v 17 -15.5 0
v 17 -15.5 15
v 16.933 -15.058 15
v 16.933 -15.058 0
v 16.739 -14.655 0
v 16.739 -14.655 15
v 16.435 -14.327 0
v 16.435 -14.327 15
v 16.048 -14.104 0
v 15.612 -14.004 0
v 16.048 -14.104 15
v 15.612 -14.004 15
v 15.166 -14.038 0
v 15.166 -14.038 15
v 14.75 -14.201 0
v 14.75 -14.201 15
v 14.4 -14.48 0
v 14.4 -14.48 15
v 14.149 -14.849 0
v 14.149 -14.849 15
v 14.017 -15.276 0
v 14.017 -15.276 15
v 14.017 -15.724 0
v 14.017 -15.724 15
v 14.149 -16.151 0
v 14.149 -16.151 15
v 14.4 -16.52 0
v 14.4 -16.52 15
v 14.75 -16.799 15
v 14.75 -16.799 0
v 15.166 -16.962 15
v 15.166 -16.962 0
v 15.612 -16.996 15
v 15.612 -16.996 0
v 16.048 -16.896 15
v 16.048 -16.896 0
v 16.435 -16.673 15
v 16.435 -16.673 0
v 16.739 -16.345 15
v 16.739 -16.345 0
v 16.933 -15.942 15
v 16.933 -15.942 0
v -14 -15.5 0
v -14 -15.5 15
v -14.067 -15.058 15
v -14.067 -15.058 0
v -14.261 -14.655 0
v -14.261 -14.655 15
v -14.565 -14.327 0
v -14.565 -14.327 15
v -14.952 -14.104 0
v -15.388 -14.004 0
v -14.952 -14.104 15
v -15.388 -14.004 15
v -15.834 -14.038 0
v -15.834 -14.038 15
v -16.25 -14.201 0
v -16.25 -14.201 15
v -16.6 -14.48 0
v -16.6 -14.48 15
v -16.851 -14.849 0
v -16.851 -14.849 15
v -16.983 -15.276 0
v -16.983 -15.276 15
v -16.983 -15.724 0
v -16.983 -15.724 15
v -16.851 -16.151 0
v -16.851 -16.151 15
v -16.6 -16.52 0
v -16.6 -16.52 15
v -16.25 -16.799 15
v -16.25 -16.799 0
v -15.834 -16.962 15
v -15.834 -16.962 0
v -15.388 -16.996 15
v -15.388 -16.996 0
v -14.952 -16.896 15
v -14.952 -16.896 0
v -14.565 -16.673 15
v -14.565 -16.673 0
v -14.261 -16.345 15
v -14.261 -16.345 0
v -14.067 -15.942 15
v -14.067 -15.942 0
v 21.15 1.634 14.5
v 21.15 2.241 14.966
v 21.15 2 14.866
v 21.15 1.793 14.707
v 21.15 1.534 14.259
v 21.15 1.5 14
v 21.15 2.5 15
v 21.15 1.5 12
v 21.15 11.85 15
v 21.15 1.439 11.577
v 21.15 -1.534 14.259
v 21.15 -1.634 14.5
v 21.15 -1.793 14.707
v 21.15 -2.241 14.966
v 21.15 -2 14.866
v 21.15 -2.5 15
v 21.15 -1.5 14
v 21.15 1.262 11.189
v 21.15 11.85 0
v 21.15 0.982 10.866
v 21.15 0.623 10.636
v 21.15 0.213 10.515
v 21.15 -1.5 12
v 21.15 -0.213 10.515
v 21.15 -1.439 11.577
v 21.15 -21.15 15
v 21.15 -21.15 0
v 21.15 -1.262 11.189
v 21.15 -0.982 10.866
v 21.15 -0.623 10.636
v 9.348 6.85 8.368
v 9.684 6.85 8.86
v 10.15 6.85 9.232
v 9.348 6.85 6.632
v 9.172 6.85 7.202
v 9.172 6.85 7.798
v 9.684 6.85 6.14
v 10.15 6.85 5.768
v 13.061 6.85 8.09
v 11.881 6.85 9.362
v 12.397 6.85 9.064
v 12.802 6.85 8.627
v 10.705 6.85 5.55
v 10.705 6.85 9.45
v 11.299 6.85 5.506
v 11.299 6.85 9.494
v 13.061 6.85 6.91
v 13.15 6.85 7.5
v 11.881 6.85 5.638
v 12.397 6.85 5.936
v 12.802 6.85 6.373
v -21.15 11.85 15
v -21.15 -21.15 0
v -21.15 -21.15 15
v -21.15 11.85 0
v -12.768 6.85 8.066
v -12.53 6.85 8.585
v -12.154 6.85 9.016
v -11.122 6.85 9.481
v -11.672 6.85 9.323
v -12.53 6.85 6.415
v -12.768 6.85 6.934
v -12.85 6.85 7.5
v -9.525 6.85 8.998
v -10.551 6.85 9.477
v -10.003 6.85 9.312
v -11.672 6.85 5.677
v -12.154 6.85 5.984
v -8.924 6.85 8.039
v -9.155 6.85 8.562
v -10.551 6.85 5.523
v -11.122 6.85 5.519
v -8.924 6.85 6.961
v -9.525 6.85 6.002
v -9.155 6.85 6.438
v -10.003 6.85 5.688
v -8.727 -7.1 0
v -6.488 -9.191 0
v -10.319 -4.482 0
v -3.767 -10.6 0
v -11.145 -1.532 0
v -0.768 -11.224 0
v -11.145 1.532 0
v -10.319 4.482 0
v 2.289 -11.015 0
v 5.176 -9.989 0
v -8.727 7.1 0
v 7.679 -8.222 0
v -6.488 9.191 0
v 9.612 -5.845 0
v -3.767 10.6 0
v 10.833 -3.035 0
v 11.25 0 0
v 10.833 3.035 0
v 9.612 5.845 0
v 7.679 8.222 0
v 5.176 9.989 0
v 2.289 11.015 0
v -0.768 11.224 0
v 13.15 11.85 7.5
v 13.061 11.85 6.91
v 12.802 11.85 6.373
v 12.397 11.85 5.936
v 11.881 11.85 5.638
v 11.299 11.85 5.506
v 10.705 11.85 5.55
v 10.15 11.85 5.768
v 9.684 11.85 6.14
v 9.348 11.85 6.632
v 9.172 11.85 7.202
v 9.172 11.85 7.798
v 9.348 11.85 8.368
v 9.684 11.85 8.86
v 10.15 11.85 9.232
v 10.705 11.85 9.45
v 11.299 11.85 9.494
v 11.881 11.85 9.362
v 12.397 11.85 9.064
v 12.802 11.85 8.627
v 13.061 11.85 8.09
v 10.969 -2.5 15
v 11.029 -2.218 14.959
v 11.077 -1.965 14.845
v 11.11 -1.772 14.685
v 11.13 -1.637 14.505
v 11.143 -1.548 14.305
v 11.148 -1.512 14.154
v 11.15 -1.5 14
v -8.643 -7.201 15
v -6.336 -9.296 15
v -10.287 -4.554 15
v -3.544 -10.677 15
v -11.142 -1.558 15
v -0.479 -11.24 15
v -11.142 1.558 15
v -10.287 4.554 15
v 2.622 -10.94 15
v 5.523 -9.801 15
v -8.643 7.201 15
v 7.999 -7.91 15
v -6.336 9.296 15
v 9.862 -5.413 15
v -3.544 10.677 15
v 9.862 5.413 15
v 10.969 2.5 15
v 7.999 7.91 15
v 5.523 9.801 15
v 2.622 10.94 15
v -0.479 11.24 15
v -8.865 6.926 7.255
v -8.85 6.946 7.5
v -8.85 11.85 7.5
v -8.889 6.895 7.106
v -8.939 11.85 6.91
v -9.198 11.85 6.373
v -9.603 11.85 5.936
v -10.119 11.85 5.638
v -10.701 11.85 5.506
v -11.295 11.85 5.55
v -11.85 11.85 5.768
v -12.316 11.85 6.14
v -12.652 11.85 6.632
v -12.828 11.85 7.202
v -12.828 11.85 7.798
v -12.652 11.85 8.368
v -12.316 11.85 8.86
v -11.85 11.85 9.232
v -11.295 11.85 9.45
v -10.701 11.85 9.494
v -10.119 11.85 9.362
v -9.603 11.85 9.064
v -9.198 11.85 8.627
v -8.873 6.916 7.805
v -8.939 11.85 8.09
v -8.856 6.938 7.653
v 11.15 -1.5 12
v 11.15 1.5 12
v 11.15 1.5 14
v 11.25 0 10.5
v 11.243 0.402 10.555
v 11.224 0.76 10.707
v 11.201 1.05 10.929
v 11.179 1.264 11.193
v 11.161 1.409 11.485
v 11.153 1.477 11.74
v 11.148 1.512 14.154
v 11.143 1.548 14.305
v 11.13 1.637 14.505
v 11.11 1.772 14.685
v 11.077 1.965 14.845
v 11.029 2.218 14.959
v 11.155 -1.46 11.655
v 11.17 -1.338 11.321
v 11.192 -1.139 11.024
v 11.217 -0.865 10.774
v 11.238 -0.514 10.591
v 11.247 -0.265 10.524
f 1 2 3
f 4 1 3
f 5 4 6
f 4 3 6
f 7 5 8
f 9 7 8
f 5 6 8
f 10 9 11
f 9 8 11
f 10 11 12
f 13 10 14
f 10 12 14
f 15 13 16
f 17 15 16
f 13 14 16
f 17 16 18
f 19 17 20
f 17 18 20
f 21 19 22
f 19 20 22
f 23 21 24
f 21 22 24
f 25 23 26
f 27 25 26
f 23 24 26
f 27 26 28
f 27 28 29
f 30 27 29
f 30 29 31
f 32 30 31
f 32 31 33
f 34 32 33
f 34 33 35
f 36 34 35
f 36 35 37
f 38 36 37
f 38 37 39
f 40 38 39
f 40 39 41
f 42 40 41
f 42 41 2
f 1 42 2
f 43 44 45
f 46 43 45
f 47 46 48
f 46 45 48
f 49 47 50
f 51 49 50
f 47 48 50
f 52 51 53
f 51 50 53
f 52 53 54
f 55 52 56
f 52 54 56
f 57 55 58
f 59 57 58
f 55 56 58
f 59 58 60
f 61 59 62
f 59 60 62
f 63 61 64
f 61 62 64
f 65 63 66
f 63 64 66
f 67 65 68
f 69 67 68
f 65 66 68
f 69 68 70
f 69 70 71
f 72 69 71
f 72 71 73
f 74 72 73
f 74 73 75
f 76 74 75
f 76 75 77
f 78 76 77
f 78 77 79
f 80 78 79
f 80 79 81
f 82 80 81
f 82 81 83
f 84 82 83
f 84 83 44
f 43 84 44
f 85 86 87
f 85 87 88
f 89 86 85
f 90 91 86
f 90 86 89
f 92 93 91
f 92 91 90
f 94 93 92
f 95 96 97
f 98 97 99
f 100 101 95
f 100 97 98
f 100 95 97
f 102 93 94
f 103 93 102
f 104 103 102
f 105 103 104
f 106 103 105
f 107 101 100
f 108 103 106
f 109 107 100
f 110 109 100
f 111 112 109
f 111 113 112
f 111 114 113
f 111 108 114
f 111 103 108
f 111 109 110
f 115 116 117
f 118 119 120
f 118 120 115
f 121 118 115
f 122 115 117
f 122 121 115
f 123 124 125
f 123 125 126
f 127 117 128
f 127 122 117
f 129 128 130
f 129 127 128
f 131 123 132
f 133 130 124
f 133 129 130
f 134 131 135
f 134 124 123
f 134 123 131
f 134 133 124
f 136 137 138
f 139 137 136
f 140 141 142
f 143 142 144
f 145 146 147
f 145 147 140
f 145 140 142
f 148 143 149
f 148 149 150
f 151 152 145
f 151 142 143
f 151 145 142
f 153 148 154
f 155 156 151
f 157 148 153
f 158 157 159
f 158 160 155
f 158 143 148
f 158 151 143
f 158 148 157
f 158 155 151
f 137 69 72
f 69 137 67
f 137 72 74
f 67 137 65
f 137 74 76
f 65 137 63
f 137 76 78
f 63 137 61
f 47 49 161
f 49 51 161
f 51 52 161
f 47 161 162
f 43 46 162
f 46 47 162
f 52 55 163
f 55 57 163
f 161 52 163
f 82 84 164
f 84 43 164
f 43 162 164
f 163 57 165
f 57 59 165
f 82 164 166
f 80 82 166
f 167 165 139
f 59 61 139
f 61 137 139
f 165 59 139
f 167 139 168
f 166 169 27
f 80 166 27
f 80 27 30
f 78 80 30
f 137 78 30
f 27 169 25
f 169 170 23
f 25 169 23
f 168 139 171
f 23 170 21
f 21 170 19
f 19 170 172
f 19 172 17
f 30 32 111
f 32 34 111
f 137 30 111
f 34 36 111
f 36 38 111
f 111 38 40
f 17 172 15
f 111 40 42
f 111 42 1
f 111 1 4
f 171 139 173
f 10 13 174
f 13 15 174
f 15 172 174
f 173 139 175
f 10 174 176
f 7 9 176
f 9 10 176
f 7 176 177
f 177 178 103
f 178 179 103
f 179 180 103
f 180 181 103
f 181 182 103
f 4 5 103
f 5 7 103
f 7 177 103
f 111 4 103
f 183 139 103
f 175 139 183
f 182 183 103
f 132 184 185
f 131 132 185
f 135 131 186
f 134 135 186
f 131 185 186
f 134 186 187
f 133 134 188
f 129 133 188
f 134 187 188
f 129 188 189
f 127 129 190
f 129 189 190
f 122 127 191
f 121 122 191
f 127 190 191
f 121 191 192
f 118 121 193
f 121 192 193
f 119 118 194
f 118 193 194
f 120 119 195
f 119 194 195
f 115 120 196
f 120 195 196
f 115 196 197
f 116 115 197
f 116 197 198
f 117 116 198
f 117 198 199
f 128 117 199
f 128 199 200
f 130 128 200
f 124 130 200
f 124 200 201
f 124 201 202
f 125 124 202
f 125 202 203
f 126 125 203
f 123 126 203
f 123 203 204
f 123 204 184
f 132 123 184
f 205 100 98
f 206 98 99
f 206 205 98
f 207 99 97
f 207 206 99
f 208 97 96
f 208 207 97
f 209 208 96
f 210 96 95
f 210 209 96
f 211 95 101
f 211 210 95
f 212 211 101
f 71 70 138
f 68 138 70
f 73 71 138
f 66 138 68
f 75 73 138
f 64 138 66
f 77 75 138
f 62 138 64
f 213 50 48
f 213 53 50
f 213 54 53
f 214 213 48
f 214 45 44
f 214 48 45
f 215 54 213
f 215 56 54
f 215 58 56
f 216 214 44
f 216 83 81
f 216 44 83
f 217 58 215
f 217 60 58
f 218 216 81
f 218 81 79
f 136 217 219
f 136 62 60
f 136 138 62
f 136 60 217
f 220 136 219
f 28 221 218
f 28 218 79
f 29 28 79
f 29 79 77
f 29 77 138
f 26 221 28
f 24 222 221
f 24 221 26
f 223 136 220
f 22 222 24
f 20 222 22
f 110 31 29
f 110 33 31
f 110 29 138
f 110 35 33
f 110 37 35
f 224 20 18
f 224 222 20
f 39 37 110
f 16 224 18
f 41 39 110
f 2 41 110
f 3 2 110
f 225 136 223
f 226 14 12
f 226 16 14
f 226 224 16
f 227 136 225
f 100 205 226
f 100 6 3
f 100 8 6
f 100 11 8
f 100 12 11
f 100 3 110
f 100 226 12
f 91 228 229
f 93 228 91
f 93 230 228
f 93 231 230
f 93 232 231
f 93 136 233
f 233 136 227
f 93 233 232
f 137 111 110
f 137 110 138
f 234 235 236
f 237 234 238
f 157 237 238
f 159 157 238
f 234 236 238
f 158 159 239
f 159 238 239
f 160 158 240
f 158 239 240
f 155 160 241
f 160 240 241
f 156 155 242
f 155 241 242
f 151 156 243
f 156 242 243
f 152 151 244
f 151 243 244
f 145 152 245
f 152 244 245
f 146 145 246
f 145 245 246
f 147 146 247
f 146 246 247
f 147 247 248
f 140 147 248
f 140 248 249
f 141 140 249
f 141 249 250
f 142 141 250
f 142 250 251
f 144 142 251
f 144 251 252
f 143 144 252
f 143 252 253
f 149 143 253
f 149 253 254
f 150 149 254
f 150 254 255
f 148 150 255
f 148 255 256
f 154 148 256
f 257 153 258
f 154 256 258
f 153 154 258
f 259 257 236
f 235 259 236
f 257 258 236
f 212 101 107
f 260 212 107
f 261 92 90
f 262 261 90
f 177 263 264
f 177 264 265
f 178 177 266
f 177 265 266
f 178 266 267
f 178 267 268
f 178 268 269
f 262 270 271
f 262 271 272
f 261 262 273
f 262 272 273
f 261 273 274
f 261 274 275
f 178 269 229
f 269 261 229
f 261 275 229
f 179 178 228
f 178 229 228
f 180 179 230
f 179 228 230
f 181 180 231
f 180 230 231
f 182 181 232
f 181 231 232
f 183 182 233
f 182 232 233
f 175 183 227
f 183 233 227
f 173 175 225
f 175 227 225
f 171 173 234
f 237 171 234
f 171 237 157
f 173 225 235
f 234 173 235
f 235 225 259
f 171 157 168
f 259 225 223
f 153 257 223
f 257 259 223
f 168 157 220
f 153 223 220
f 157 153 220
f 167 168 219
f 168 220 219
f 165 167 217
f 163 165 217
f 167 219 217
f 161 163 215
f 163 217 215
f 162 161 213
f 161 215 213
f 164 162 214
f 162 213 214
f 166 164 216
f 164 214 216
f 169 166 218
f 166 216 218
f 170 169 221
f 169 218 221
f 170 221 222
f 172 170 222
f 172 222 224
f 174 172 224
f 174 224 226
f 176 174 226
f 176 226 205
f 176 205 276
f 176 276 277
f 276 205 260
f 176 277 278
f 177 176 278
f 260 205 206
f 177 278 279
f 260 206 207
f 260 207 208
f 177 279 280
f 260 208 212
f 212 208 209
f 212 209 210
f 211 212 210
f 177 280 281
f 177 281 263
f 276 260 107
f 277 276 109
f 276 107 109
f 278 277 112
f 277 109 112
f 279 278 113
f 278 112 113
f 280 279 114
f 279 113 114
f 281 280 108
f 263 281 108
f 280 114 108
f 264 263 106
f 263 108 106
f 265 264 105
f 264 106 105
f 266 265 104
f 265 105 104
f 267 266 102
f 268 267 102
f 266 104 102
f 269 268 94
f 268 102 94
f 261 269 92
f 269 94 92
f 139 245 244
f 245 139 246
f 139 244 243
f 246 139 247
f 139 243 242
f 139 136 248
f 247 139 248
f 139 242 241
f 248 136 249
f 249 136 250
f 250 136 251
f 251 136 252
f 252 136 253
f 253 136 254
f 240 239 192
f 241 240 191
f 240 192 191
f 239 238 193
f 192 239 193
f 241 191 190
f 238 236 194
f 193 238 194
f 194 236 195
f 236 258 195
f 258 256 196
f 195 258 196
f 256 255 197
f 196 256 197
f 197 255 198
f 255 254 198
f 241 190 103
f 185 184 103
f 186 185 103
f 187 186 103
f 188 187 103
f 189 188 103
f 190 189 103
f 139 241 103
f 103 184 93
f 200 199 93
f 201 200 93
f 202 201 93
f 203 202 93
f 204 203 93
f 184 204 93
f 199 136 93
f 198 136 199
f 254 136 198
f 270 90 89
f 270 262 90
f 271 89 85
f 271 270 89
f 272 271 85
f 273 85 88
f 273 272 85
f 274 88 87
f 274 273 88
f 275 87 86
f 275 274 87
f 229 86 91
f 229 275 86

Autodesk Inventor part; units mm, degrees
ref_plane "YZ Plane" through (0, 0, 0) normal (1, 0, 0) x (0, 1, 0)
ref_plane "XZ Plane" through (0, 0, 0) normal (0, 1, 0) x (-1, 0, 0)
ref_plane "XY Plane" through (0, 0, 0) normal (0, 0, 1) x (1, 0, 0)
sketch "Boceto16" plane through (0, 0, 0) normal (0, 0, 1) x (1, 0, 0)
  line L0 (-21.15, 21.15) -> (21.15, 21.15)
  line L1 (21.15, 21.15) -> (21.15, -21.15)
  line L2 (21.15, -21.15) -> (-21.15, -21.15)
  line L3 (-21.15, -21.15) -> (-21.15, 21.15)
  line L4 (2.3235, 0) -> (0, 0)
  line L5 (0, 0) -> (0, 2.4447)
  dimension "d75" = 42.3
  dimension "d76" = 42.3
extrude "Extrusión15" add sketch "Boceto16" along normal blind 15
sketch "Boceto17" plane through (0, 0, 15) normal (0, 0, 1) x (1, 0, 0)
  circle A0 centre (15.5, 15.5) radius 1.5
  point P0 (0, 0)
  dimension "d79" = 3
  dimension "d80" = 15.5
  dimension "d81" = 15.5
extrude "Extrusión16" cut sketch "Boceto17" against normal through all
pattern_linear "Patrón rectangular2" count 2 spacing 31 along (-1, 0, 0) count 2 spacing 31 along (0, -1, 0) of "Extrusión16"
sketch "Boceto18" plane through (0, 0, 15) normal (0, 0, 1) x (1, 0, 0)
  line L0 (-21.15, -21.15) -> (21.15, -21.15) projected
  line L1 (-21.15, 21.15) -> (-21.15, -21.15) projected
  line L2 (21.15, -21.15) -> (-21.15, -21.15)
  line L3 (-21.15, -21.15) -> (-21.15, 11.85)
  line L4 (-21.15, 11.85) -> (21.15, 11.85)
  line L5 (21.15, 11.85) -> (21.15, -21.15)
  circle A0 centre (-15.5, -15.5) radius 1.5 projected
  circle A1 centre (15.5, -15.5) radius 1.5 projected
  circle A2 centre (-15.5, 15.5) radius 1.5 projected
  circle A3 centre (15.5, 15.5) radius 1.5 projected
  line L6 (-21.15, -21.15) -> (21.15, -21.15) projected
  line L7 (21.15, -21.15) -> (21.15, 21.15) projected
  line L8 (21.15, 21.15) -> (-21.15, 21.15) projected
  line L9 (-21.15, 21.15) -> (-21.15, -21.15) projected
  point P0 (0, 0)
  point P1 (21.15, 11.85)
  dimension "d90" = 33
extrude "Extrusión17" cut sketch "Boceto18" against normal through all contours L1 L8 L7 L4
sketch "Boceto19" plane through (0, 0, 15) normal (0, 0, 1) x (1, 0, 0)
  circle A0 centre (0, 0) radius 11.25
  dimension "d93" = 22.5
extrude "Extrusión18" cut sketch "Boceto19" against normal through all
sketch "Boceto20" plane through (21.15, -21.15, 15) normal (1, 0, 0) x (0, 0, -1)
  line L0 (0, 0) -> (0, 33) projected
  circle A0 centre (0, 21.15) radius 1.5
  circle A1 centre (3, 21.15) radius 1.5
  line L1 (15, 33) -> (0, 33) projected
  line L2 (3, 22.65) -> (0, 22.65)
  line L3 (0, 19.65) -> (3, 19.65)
  line L4 (0, 9.9) -> (0, 32.4) projected
  line L5 (3, 21.15) -> (2.4132, 21.15)
  line L6 (15, 21.15) -> (14.0554, 21.15)
  dimension "d99" = 3
  dimension "d102" = 3
  dimension "d103" = 3
extrude "Extrusión19" cut sketch "Boceto20" against normal up to surface contours L0 A0 | A0 A1 L3 | L2 A1 A0 | A1 picked at (0.2169, 21.6005)
fillet "Empalme3" radius 1 2 edges at (16.1498, 1.5, 15) (16.1498, -1.5, 15)
sketch "Boceto21" plane through (-21.15, 11.85, 15) normal (0, 1, 0) x (1, 0, 0)
  circle A0 centre (32.3, 7.5) radius 2
  circle A1 centre (10.3, 7.5) radius 2
  line L0 (0, 15) -> (42.3, 15) projected
  line L1 (42.3, 15) -> (42.3, 0) projected
  line L2 (0, 0) -> (0, 15) projected
  point P0 (21.15, 15)
  dimension "d105" = 4
  dimension "d106" = 4
  dimension "d107" = 7.5
  dimension "d108" = 7.5
  dimension "d111" = 10
  dimension "d115" = 32
extrude "Extrusión20" cut sketch "Boceto21" against normal blind 5
equation "\"d102\" = d99"
equation "\"d106\" = d105"
equation "\"d107\" = d108"
properties part number "Soporte Motor Izq" material "Polietileno, baja densidad"
